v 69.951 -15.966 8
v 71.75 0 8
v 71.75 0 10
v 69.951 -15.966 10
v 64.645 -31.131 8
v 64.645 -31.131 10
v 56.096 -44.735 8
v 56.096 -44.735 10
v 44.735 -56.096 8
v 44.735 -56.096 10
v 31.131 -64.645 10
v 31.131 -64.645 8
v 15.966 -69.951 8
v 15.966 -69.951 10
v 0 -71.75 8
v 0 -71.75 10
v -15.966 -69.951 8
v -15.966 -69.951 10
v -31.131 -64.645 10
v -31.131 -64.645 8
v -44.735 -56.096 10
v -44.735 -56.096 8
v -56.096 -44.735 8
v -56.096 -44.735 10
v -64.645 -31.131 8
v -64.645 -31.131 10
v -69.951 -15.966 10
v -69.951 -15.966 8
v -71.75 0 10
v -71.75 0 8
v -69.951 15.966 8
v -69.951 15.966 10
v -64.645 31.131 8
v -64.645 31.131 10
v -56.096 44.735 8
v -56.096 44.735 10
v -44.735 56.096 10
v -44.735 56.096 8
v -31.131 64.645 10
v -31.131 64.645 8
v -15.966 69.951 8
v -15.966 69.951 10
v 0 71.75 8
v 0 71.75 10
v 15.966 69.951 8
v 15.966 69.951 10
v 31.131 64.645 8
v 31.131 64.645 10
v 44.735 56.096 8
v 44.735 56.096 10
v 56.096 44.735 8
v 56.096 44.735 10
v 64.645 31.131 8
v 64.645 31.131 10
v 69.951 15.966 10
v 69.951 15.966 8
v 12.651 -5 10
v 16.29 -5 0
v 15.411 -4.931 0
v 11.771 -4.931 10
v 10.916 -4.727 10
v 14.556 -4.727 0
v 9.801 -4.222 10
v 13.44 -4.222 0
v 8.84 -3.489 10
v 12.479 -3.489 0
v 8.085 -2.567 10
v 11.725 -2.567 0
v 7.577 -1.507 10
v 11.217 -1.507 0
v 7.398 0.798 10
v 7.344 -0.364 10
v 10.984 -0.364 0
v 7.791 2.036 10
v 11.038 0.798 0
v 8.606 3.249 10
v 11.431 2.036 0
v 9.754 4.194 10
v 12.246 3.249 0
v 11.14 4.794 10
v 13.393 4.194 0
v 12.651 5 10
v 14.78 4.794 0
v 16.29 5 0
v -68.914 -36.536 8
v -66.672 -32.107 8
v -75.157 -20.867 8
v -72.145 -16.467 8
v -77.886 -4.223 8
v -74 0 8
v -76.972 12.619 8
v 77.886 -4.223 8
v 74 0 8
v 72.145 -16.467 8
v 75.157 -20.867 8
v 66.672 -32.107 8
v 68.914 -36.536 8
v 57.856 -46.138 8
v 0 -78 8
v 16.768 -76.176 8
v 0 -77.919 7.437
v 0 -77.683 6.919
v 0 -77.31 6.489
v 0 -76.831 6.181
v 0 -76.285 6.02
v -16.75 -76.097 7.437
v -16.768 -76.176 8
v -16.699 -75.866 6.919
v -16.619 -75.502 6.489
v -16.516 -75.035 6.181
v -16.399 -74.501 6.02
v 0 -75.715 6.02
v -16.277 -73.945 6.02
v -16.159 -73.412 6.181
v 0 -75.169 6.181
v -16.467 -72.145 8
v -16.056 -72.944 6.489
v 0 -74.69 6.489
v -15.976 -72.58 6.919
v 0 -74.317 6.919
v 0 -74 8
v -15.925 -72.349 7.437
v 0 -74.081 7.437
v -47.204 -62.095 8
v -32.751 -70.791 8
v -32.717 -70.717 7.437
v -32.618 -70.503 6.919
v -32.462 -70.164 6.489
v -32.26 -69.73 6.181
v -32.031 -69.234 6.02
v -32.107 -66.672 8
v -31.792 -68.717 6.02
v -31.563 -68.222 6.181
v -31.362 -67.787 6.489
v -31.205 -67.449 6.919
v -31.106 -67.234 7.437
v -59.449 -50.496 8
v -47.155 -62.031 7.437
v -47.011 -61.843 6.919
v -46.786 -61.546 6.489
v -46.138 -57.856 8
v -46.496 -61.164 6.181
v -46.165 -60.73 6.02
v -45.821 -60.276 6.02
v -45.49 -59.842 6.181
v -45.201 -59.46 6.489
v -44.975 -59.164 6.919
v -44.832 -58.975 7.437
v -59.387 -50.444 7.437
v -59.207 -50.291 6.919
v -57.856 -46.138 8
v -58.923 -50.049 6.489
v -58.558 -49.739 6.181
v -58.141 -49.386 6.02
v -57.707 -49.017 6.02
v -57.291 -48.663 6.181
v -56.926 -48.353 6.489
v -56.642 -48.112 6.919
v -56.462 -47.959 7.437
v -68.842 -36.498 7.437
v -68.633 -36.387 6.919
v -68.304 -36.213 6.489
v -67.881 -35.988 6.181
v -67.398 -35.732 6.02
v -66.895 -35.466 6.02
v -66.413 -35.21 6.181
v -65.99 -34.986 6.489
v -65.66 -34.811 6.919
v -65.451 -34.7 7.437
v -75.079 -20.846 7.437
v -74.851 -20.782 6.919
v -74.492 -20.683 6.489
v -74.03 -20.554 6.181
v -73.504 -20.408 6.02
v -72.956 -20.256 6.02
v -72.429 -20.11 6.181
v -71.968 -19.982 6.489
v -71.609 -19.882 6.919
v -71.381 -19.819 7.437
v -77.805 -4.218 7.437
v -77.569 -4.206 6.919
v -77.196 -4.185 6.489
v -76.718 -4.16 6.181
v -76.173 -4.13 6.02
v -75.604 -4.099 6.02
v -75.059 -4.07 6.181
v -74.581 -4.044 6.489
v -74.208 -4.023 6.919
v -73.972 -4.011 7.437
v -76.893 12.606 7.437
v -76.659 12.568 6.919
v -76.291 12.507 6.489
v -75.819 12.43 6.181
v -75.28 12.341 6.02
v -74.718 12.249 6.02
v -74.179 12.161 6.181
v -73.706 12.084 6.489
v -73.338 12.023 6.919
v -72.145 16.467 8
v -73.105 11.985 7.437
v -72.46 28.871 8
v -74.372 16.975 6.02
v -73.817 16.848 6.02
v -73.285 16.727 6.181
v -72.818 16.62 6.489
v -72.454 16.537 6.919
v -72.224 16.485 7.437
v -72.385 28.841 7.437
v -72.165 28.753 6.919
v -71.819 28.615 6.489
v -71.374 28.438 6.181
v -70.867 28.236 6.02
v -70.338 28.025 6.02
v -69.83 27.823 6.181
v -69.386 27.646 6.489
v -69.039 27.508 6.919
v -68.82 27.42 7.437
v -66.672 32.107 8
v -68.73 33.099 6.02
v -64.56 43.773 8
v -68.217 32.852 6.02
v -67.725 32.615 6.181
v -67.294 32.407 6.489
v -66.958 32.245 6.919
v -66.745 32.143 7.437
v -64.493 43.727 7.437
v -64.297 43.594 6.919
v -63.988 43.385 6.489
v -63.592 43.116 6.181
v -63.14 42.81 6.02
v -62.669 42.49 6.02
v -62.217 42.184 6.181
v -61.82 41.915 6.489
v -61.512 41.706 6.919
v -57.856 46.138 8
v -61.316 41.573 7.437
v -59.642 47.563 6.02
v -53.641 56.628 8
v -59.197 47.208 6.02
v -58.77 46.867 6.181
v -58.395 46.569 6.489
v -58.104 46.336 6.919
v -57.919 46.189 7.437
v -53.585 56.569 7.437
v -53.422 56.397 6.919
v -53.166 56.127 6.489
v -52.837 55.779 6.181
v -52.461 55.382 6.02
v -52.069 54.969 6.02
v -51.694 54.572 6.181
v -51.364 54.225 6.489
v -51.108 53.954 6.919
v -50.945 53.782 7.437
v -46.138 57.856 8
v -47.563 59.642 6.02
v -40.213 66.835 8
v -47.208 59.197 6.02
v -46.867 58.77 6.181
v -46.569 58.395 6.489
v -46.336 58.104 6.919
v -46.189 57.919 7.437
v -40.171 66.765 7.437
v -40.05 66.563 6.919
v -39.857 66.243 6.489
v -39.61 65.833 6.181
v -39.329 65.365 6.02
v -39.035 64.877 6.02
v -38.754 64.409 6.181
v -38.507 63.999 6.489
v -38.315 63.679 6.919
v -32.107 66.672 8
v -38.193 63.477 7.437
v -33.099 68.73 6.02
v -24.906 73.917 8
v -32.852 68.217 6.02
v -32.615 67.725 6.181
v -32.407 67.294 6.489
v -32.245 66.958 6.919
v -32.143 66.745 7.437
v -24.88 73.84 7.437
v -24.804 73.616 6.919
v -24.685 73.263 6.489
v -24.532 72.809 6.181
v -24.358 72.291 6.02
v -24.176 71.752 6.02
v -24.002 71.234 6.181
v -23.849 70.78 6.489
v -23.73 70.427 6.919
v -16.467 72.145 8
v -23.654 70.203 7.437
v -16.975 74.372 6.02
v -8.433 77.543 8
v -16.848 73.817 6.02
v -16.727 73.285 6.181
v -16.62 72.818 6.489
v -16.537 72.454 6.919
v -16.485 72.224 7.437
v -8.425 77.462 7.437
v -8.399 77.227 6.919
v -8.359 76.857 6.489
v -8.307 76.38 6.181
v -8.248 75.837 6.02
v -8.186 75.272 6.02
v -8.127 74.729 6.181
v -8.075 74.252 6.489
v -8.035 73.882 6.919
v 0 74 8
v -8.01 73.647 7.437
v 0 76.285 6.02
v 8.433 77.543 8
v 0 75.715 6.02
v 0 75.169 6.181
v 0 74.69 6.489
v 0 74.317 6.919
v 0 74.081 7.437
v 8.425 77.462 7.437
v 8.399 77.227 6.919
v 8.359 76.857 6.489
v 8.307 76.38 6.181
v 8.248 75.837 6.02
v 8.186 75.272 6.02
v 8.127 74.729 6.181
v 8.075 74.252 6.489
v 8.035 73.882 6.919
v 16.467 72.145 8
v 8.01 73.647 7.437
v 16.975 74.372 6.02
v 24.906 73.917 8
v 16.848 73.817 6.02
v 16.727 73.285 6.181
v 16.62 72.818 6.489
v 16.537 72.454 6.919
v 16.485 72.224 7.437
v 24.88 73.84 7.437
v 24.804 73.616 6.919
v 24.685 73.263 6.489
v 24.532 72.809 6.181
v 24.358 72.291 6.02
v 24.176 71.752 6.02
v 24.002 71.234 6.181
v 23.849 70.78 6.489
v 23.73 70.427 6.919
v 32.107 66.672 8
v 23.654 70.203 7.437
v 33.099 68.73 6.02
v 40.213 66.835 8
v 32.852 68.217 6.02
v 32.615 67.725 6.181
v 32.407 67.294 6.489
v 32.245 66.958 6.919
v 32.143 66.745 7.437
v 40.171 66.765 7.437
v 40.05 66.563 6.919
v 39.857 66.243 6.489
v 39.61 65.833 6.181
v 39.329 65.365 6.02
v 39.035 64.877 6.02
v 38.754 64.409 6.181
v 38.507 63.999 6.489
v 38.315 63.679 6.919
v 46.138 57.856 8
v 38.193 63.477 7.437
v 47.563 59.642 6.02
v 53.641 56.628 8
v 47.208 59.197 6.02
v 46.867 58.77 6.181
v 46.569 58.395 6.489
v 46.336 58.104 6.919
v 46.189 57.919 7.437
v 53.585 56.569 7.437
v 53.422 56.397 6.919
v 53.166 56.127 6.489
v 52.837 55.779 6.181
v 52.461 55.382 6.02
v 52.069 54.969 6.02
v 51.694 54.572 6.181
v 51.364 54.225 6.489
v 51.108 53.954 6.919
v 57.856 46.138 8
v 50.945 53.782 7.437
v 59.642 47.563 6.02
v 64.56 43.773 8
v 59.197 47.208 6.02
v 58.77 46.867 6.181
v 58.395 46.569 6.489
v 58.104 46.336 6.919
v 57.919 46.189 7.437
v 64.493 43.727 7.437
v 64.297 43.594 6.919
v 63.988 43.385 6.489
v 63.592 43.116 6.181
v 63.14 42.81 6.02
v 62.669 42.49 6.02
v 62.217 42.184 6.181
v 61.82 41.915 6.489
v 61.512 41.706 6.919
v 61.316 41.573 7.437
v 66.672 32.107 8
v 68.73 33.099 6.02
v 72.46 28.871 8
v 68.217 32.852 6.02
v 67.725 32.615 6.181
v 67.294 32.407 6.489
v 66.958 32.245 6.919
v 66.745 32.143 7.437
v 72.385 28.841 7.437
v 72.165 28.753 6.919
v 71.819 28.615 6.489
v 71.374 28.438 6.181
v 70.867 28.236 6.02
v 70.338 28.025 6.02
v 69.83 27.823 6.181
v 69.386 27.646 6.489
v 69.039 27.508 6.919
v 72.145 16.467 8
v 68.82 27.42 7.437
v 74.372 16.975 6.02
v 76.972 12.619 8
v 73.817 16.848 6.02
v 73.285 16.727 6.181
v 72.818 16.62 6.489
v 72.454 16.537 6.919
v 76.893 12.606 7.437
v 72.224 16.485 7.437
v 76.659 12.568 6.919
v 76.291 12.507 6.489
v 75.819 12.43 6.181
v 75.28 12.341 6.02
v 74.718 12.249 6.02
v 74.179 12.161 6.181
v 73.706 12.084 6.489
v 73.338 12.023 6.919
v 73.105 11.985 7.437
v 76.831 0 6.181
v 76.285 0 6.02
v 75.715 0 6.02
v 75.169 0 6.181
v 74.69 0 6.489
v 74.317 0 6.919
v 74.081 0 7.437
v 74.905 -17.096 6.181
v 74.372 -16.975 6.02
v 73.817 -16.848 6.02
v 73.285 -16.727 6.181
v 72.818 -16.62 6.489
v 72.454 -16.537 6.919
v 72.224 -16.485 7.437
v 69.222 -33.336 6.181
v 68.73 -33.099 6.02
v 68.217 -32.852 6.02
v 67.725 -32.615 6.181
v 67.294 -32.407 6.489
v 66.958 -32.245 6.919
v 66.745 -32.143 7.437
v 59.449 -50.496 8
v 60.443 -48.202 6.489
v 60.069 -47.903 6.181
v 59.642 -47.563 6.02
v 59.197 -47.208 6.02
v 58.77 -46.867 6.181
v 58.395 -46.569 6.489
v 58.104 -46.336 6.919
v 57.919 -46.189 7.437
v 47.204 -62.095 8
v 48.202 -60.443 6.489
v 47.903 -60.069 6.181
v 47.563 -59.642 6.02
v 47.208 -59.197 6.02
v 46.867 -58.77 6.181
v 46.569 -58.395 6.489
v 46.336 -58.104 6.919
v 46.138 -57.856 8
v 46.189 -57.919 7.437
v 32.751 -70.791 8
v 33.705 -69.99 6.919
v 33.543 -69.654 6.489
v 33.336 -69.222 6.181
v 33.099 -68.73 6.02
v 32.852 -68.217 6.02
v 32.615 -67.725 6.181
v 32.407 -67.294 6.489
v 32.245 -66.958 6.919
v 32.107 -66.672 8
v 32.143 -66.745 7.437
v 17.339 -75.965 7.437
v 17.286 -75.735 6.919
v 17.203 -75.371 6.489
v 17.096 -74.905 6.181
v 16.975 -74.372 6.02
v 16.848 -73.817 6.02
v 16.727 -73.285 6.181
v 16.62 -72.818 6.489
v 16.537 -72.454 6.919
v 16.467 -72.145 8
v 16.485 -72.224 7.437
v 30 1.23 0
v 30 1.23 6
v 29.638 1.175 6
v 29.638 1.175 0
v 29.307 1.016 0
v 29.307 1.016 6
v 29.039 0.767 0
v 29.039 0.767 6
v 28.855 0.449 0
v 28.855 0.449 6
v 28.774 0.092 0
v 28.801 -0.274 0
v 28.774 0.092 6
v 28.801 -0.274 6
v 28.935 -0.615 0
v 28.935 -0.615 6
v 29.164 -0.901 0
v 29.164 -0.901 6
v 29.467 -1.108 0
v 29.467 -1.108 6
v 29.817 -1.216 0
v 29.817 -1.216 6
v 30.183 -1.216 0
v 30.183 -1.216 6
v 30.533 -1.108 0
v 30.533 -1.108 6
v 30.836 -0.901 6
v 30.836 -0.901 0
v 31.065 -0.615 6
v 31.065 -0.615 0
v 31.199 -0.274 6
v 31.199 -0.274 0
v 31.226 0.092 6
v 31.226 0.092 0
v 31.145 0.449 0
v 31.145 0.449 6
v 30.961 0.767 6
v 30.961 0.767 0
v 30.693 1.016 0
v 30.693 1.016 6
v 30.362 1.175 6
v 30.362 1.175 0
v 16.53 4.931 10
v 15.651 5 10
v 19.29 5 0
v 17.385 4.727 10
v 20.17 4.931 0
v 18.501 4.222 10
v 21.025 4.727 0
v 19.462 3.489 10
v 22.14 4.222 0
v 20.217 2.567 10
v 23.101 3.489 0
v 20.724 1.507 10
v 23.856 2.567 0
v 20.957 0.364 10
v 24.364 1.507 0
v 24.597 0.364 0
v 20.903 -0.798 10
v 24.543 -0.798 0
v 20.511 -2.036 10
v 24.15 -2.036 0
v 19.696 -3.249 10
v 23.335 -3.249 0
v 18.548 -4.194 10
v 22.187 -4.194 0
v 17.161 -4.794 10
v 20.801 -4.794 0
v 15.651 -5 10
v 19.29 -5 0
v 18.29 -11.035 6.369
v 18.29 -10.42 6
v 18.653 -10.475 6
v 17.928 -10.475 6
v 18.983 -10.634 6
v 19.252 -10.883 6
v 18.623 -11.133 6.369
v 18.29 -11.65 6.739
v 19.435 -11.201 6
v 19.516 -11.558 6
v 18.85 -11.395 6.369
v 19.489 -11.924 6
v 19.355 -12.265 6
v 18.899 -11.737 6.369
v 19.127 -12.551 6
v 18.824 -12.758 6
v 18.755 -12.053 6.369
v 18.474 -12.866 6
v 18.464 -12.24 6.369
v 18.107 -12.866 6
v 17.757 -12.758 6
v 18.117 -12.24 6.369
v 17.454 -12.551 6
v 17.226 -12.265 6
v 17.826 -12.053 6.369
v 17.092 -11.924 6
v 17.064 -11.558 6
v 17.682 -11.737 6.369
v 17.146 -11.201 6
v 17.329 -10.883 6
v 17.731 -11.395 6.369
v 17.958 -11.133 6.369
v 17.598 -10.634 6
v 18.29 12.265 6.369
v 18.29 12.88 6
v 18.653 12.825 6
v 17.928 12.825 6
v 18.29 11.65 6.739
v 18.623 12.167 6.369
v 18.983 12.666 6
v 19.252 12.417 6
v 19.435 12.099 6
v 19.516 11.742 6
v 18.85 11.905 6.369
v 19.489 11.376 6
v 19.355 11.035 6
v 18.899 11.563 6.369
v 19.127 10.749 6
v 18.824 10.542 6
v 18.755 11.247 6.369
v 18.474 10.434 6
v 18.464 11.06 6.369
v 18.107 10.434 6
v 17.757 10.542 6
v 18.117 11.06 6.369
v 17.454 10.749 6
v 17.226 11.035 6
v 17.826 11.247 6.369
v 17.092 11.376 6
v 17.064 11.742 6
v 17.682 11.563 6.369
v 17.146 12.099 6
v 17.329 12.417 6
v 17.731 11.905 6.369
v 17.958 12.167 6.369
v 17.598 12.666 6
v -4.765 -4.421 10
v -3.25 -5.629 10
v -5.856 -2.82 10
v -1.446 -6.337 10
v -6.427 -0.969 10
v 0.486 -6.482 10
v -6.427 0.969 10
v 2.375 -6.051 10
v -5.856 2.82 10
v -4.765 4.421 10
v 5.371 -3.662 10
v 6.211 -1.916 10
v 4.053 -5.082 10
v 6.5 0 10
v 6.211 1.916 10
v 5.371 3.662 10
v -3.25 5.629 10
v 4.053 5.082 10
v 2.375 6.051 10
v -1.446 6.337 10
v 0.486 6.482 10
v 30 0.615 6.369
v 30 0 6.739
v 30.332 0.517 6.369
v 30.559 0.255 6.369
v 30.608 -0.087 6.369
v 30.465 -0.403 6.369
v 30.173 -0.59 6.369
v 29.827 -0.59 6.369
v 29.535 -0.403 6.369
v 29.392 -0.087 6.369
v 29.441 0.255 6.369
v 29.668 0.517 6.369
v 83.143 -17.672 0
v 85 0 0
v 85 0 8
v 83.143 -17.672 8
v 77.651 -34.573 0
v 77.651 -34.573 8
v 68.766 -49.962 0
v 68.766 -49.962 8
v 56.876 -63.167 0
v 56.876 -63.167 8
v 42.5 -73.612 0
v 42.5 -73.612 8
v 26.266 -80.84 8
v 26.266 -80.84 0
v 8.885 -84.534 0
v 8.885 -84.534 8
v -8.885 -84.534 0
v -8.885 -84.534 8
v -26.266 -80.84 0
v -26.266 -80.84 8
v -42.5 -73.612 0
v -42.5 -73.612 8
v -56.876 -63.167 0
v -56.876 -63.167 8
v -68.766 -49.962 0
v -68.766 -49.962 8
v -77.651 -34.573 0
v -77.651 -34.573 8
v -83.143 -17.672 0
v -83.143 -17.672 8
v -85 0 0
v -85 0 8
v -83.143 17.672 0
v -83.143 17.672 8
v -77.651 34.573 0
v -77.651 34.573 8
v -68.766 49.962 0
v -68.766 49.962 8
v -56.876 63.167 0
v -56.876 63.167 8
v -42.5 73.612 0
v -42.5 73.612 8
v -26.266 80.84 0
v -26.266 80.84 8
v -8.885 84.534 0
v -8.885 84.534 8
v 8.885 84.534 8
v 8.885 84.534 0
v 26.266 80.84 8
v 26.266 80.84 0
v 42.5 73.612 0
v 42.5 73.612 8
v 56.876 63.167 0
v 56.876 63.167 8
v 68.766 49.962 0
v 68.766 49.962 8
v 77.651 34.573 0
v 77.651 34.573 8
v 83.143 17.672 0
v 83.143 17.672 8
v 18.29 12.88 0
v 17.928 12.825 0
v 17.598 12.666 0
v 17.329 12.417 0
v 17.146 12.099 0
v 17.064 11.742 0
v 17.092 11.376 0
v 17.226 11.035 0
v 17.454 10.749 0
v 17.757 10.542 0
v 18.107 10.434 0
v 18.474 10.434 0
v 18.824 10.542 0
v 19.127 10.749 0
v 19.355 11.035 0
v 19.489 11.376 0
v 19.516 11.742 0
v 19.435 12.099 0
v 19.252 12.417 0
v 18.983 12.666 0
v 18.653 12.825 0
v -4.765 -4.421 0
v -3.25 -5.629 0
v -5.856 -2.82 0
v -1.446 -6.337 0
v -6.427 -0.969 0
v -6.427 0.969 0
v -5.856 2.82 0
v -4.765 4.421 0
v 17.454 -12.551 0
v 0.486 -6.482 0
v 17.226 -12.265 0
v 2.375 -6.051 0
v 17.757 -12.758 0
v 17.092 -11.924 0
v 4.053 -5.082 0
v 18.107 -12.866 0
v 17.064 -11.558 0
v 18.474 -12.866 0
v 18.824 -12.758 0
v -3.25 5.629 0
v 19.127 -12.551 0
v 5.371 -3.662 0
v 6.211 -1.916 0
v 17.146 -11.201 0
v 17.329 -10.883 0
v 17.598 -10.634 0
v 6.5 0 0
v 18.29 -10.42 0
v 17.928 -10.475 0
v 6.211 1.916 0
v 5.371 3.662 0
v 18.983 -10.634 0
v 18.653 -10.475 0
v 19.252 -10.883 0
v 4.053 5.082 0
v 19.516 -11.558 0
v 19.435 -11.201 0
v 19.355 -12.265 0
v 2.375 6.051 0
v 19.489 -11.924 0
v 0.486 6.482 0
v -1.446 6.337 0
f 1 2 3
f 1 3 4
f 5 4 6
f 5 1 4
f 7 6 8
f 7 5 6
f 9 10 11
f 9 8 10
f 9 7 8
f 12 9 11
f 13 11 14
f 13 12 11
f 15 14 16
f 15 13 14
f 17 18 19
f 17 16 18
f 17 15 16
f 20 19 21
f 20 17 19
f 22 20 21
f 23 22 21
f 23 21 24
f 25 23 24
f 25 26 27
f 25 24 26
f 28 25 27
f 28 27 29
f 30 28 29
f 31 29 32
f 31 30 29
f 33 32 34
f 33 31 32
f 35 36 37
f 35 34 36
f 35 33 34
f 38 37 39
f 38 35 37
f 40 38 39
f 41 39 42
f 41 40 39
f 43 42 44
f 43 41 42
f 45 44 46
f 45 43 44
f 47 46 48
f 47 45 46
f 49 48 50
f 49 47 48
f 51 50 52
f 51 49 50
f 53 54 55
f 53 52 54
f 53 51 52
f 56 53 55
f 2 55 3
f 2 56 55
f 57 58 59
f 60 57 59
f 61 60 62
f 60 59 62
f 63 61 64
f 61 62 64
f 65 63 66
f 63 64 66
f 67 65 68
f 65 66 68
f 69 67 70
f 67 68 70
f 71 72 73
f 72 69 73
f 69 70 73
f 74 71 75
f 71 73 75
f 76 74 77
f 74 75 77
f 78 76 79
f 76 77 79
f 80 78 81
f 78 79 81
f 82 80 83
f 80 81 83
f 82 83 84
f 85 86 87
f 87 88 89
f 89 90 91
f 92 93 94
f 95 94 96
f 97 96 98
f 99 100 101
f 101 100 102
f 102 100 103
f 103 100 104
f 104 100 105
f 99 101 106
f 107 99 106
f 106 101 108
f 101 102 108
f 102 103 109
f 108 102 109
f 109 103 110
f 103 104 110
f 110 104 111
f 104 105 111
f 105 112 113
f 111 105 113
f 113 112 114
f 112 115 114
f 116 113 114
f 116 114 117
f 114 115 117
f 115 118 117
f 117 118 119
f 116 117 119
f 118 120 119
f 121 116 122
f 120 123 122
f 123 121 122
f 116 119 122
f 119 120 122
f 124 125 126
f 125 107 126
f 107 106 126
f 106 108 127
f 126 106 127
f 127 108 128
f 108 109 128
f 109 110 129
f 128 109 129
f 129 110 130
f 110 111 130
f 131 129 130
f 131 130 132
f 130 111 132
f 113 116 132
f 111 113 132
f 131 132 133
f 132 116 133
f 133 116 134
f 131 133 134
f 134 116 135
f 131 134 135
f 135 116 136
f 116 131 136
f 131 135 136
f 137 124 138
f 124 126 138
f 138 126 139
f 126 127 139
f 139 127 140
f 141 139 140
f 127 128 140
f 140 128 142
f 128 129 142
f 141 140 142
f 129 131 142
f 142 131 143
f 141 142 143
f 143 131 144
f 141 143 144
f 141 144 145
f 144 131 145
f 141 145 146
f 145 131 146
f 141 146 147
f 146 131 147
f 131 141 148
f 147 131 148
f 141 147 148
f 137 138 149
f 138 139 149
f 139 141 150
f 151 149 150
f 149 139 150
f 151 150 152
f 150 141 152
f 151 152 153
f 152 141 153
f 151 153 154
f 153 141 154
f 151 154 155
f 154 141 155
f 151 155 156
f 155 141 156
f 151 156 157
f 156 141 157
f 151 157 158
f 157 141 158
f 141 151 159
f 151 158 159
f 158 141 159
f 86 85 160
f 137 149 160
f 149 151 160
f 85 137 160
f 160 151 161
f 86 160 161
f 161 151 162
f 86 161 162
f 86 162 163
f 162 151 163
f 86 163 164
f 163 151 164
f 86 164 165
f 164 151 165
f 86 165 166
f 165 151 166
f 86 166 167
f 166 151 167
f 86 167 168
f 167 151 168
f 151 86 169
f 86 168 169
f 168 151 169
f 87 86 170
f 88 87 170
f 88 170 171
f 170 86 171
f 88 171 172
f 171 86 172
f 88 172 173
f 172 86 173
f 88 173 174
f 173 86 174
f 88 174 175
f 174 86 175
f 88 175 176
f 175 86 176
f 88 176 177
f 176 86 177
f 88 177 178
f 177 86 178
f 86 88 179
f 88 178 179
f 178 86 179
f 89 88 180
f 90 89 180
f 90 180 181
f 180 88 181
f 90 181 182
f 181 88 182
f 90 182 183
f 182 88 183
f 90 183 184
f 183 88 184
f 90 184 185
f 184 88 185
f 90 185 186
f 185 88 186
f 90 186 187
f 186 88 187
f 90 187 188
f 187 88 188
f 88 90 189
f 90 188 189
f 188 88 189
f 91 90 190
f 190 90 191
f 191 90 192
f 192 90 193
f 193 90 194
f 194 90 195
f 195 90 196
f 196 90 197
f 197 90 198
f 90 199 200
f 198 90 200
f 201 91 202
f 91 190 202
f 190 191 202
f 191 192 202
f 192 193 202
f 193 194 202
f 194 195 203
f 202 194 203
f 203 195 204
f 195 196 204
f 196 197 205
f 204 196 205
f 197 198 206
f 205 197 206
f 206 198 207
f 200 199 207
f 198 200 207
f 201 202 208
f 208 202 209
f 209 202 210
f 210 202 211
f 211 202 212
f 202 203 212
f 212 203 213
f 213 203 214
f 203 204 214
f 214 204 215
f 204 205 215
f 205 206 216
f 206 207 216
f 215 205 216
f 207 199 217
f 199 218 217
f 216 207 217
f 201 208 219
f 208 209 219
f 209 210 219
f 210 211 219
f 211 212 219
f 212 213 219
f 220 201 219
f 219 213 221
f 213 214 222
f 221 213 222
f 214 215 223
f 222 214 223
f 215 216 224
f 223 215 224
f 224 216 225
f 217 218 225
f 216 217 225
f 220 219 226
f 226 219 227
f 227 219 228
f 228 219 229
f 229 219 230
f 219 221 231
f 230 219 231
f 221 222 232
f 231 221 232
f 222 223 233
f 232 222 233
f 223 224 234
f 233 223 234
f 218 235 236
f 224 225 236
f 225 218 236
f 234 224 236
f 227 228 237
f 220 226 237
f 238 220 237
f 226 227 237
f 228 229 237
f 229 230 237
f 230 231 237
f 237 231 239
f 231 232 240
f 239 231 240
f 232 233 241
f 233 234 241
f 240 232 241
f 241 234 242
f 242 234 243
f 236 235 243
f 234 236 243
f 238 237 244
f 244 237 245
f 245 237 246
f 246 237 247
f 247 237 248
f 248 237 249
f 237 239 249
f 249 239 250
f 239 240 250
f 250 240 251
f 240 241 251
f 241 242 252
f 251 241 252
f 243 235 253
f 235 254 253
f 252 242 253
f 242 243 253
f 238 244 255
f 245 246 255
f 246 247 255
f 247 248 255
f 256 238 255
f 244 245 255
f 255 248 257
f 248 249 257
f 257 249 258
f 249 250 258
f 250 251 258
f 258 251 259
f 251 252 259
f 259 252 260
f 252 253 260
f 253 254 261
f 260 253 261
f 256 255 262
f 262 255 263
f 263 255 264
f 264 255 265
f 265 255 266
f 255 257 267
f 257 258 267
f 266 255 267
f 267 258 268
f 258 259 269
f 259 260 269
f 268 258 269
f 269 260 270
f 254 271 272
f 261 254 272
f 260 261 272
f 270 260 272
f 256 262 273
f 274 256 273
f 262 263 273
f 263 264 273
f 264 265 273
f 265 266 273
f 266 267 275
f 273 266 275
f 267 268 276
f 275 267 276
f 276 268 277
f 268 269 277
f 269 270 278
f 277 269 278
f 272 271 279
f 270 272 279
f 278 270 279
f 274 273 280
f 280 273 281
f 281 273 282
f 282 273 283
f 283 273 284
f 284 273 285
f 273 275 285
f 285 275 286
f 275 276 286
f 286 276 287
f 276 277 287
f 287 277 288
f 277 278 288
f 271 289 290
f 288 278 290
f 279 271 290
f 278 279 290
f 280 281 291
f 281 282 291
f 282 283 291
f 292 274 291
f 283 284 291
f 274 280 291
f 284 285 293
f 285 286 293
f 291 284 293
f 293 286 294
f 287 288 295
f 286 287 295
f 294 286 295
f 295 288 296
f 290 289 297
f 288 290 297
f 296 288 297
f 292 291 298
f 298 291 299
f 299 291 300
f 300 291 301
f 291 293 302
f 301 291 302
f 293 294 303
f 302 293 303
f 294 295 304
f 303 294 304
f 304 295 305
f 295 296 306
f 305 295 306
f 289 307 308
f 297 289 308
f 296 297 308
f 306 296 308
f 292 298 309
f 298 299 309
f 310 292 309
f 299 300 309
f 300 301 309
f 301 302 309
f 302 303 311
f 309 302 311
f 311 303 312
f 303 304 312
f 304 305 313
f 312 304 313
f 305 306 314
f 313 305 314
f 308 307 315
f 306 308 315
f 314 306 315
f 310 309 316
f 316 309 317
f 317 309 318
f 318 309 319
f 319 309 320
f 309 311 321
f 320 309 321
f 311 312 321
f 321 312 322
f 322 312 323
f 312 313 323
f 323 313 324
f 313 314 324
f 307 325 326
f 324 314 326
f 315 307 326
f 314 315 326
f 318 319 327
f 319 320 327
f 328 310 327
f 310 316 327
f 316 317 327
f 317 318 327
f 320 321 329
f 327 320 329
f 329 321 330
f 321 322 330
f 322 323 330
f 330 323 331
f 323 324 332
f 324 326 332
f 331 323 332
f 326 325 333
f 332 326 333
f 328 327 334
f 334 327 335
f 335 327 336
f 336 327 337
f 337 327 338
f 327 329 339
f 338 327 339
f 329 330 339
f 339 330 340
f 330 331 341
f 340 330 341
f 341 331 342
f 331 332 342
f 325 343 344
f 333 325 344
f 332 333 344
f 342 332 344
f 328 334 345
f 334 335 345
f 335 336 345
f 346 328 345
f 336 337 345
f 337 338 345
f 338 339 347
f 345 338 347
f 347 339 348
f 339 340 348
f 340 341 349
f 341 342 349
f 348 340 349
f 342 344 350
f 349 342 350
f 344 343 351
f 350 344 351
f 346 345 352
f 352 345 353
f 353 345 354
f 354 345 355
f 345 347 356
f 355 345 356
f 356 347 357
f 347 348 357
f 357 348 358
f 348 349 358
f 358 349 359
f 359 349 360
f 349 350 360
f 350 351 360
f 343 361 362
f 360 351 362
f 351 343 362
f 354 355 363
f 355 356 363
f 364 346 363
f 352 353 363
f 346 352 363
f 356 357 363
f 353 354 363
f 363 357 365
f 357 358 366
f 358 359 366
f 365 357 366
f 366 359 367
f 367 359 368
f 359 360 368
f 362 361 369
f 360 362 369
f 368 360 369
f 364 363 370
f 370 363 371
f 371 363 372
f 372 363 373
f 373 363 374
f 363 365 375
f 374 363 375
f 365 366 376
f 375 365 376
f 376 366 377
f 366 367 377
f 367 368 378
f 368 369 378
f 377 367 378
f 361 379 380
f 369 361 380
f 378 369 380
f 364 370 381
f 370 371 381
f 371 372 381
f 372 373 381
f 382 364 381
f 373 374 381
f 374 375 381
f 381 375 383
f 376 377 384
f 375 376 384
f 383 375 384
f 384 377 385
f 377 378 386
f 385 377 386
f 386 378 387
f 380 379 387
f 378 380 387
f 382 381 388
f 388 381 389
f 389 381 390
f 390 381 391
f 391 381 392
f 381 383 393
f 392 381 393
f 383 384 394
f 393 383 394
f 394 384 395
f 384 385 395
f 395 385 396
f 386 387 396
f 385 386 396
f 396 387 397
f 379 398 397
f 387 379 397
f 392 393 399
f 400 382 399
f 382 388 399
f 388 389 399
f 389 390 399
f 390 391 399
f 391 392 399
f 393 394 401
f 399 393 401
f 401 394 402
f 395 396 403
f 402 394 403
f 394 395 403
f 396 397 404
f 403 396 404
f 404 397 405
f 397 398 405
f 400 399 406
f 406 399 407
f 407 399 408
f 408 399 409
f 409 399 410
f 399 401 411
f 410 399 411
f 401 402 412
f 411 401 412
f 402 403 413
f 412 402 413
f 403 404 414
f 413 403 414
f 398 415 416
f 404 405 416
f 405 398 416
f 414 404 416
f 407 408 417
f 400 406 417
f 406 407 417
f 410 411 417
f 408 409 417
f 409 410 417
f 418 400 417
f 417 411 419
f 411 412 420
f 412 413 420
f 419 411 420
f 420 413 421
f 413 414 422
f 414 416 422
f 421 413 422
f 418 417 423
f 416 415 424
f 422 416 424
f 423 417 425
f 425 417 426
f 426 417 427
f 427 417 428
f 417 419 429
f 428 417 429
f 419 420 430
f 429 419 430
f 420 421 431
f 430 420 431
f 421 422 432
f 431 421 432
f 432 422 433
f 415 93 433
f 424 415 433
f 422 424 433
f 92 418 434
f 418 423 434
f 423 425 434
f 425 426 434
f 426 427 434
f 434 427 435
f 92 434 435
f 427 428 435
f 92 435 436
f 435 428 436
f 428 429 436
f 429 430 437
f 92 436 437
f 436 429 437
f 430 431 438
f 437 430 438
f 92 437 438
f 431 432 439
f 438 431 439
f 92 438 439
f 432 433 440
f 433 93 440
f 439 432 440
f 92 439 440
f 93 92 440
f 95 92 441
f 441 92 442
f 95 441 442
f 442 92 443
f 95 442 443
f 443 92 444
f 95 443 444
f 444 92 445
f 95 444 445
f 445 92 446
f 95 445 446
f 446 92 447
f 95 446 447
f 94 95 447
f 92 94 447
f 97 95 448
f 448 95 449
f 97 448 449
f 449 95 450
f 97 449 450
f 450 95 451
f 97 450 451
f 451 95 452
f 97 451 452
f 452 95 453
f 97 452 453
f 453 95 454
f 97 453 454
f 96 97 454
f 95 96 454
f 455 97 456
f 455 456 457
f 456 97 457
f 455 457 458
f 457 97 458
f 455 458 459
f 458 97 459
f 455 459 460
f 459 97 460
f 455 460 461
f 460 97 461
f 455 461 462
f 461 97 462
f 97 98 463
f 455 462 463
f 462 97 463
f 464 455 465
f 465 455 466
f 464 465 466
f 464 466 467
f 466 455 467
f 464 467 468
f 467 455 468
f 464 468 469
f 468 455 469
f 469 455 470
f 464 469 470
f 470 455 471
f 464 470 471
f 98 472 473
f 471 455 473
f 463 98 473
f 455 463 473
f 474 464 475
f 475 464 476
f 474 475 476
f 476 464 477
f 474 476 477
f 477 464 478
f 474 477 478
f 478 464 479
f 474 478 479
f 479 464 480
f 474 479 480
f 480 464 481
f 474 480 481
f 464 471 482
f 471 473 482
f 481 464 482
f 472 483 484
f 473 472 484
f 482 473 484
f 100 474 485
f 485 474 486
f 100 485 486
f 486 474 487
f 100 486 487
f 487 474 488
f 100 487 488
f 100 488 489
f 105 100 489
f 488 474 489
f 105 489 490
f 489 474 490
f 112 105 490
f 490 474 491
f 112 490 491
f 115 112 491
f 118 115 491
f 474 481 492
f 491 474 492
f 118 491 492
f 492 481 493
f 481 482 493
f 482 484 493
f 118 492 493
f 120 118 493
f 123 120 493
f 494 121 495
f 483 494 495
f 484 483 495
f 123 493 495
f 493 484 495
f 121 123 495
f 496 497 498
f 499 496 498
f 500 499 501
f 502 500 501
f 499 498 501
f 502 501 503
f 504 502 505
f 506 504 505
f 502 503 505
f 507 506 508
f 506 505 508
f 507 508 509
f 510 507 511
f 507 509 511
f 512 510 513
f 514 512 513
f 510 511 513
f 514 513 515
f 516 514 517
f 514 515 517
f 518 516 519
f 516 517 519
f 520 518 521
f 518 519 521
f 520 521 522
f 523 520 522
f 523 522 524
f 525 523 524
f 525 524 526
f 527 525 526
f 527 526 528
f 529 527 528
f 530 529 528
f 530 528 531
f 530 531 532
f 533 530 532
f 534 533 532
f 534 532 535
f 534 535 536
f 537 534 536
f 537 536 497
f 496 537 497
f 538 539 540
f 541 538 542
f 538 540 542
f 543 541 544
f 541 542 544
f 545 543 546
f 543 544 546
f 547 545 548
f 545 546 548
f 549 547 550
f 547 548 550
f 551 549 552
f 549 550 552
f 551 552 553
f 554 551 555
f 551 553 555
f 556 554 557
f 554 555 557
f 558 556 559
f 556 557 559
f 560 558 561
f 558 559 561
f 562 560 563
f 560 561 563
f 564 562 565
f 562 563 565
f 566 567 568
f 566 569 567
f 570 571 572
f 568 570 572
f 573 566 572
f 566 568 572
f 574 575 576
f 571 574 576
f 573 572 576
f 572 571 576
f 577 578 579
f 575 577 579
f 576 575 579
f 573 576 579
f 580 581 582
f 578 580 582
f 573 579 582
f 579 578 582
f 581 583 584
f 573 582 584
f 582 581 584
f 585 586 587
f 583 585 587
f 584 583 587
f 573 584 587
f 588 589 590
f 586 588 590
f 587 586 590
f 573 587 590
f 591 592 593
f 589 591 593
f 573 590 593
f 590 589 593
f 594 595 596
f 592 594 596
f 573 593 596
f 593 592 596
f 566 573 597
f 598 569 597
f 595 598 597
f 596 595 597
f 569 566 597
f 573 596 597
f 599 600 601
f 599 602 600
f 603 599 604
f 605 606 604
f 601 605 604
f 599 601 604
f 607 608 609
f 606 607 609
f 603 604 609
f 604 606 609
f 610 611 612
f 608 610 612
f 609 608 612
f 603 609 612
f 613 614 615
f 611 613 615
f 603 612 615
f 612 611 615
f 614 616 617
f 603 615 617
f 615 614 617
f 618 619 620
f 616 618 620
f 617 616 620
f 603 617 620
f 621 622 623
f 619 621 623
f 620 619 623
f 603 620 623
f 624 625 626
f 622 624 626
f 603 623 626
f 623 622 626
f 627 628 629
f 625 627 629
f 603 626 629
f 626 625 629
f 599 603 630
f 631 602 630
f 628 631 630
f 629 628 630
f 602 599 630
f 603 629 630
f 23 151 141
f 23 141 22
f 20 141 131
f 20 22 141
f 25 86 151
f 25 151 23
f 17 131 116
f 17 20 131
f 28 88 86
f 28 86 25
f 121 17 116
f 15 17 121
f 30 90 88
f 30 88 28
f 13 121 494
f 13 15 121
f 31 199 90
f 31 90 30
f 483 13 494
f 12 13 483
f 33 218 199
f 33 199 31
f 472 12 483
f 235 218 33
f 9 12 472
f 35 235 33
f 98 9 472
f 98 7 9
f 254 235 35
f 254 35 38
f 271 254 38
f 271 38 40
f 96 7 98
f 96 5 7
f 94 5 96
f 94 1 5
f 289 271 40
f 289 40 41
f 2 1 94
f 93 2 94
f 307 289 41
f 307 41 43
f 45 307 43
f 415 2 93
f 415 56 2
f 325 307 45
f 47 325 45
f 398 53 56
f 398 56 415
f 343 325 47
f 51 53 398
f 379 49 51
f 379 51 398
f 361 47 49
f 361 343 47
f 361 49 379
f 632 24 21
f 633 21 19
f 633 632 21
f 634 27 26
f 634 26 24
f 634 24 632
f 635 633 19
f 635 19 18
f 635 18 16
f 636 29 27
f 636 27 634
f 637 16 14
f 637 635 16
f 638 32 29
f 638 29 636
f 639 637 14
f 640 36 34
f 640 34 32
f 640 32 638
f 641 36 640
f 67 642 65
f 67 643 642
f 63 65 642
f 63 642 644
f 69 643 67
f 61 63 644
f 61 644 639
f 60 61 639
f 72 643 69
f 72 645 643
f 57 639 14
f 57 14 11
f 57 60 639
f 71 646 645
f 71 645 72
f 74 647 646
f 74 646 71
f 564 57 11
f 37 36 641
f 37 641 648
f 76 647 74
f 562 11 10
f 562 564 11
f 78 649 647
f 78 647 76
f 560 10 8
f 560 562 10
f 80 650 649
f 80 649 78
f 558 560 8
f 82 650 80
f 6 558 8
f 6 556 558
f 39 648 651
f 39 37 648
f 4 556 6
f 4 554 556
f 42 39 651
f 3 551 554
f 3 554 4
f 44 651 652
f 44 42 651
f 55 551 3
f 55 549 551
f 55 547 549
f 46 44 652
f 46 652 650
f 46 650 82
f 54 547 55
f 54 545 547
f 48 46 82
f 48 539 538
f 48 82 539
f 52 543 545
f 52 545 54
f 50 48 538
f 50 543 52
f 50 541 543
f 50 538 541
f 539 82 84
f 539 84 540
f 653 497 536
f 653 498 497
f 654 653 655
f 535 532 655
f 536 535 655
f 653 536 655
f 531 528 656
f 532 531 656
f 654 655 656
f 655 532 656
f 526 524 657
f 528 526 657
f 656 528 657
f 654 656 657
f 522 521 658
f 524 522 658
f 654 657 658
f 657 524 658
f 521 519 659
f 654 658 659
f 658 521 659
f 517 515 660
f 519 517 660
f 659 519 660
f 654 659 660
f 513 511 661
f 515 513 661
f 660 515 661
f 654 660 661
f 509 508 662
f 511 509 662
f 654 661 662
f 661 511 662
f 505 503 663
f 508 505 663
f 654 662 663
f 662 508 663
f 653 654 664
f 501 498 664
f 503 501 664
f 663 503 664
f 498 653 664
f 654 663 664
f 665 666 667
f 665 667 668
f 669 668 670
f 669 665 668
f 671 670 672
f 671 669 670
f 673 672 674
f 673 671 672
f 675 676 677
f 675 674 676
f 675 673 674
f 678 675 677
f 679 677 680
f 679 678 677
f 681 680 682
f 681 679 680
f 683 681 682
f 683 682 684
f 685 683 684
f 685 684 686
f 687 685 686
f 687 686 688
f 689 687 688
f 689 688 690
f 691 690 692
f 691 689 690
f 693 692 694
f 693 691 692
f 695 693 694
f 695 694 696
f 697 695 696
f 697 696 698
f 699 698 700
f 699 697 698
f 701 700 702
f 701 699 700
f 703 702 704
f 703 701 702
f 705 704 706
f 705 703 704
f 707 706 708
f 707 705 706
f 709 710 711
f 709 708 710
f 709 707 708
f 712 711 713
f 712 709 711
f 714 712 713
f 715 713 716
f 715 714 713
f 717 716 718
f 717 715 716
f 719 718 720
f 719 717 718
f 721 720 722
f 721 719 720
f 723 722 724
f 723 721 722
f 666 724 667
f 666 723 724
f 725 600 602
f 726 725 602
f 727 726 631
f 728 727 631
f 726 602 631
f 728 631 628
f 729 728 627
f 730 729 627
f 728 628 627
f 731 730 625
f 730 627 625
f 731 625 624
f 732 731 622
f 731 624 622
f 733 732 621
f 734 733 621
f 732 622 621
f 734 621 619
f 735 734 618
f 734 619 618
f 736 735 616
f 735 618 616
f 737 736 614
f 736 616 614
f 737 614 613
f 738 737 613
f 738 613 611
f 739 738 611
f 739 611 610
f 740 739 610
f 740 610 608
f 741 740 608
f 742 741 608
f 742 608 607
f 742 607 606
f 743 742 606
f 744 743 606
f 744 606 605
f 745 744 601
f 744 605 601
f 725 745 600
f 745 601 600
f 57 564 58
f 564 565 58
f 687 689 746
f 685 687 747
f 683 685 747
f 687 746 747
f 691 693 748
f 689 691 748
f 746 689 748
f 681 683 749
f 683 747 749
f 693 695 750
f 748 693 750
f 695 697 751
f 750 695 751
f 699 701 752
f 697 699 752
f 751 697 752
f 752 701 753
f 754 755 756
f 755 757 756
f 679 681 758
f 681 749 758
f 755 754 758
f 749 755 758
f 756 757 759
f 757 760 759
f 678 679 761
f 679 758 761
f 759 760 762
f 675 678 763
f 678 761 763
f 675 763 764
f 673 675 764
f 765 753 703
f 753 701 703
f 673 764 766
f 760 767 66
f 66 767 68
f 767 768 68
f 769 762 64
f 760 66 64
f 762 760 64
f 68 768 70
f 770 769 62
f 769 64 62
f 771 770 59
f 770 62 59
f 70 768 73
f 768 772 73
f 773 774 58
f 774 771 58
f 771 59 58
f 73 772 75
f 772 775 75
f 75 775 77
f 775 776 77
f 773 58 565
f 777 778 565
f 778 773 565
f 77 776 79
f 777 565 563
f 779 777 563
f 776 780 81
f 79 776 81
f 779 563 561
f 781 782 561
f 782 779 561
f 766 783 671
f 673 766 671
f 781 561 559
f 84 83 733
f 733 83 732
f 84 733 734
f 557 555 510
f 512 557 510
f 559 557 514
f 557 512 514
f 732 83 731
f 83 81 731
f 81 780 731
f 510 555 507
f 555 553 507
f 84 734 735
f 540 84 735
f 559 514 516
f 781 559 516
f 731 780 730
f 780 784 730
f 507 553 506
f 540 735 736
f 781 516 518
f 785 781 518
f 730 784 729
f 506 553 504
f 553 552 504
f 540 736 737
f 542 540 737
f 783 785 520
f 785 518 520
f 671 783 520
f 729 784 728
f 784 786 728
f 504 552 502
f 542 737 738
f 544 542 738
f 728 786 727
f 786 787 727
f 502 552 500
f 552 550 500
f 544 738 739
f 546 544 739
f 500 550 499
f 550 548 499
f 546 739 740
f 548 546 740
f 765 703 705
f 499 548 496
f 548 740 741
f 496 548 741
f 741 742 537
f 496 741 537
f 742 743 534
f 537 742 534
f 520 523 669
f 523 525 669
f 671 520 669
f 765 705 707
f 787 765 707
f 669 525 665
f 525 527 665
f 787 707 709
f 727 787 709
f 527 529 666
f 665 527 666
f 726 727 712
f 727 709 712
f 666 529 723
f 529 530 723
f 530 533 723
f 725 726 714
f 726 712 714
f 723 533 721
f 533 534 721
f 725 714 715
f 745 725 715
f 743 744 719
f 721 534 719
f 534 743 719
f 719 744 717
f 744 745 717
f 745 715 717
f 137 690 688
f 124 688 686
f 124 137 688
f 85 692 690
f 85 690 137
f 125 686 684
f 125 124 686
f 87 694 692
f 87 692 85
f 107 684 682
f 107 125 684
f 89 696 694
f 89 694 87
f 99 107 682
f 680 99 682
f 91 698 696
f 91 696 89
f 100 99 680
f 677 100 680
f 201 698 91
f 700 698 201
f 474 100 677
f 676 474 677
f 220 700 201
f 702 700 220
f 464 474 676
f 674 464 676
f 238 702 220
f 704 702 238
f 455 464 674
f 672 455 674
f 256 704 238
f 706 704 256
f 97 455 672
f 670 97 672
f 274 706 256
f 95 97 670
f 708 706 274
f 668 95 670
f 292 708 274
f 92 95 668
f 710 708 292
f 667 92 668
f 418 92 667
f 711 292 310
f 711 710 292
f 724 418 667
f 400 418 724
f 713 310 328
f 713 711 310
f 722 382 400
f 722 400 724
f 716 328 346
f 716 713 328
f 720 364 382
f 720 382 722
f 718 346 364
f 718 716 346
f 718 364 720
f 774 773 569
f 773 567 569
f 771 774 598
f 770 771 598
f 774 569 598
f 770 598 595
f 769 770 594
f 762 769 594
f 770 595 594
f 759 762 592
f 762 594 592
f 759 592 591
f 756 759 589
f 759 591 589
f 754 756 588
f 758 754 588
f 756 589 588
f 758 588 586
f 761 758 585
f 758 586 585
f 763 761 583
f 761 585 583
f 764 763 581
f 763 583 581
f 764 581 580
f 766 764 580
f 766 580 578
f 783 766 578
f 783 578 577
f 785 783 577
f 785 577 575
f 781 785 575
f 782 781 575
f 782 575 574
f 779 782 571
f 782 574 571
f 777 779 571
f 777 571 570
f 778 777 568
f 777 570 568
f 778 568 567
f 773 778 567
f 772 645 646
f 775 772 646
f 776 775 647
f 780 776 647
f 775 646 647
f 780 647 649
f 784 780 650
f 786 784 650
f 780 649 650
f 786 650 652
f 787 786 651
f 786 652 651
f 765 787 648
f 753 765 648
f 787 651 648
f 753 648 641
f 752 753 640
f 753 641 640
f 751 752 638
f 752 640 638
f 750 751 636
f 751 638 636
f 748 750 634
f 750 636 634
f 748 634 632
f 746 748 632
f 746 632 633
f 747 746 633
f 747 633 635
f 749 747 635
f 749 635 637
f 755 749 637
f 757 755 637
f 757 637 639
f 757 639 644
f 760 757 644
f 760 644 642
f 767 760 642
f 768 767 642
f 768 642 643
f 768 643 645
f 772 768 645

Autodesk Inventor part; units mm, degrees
ref_plane "YZ Plane" through (0, 0, 0) normal (1, 0, 0) x (0, 1, 0)
ref_plane "XZ Plane" through (0, 0, 0) normal (0, 1, 0) x (-1, 0, 0)
sketch "Sketch1" plane through (0, 0, 0) normal (0, 0, 1) x (1, 0, 0)
  circle A0 centre (0, 0) radius 85
  dimension "d0" = 170
extrude "Extrusion1" add sketch "Sketch1" along normal blind 8
sketch "Sketch2" plane through (0, 0, 8) normal (0, 0, 1) x (1, 0, 0)
  circle A0 centre (0, 0) radius 71.75
  dimension "d3" = 143.5
extrude "Extrusion2" add sketch "Sketch2" along normal blind 2
sketch "Sketch3" plane through (0, 0, 10) normal (0, 0, 1) x (1, 0, 0)
  circle A0 centre (0, 0) radius 6.5
  dimension "d6" = 13
extrude "Extrusion3" cut sketch "Sketch3" against normal through all
sketch "Sketch4" plane through (0, 0, 0) normal (0, 1, 0) x (-1, 0, 0)
  line L0 (0, 53) -> (-39.9771, -56.8361) construction
  line L1 (85, 8) -> (-85, 8) construction
  line L2 (0, -78.8034) -> (0, 74.9672) construction
  point P0 (0, 0)
  dimension "d9" = 45
  dimension "d10" = 20
ref_plane "Work Plane1" through (19.2904, 0, 0) normal (0.342, 0, -0.9397) x (0, 1, 0)
sketch "Sketch5" plane through (19.2904, 0, 0) normal (0.342, 0, -0.9397) x (0, 1, 0)
  line L0 (0, 0) -> (0, -2.8191) construction
  line L1 (-5, 0) -> (-5, -2.8191)
  line L2 (5, -2.8191) -> (5, 0)
  arc A0 (5, 0) -> (-5, 0) centre (0, 0) ccw
  arc A1 (-5, -2.8191) -> (5, -2.8191) centre (0, -2.8191) ccw
  line L3 (0, 0) -> (0, -2) construction
  line L4 (-5, 0) -> (-5, -2)
  line L5 (5, -2) -> (5, 0)
  arc A2 (5, 0) -> (-5, 0) centre (0, 0) ccw
  arc A3 (-5, -2) -> (5, -2) centre (0, -2) ccw
  point P0 (0, -18.1271)
  point P1 (0, -1.4095)
  point P2 (0, -1)
  point P3 (-5, -2)
  point P4 (5, -2)
  dimension "d12" = 10
  dimension "d13" = 2.8191
  dimension "d37" = 2
extrude "Extrusion4" cut sketch "Sketch5" against normal through all both and the other way through all
sketch "Sketch10" plane through (0, 0, 0) normal (0, 0, -1) x (-1, 0, 0)
  line L0 (119, 0) -> (-119, 0) projected
  line L1 (0, 0) -> (-18.2904, -11.65) construction
  line L2 (-18.2904, -11.65) -> (-18.2904, -5) construction
  line L3 (-16.2904, -5) -> (-19.2904, -5) construction
  point P0 (-18.2904, 11.65)
  point P1 (-30, 0)
  dimension "d50" = 30
  dimension "d60" = 11.65
  dimension "d61" = 1
hole "Hole1" at (18.2904, -11.65, 0) at (18.2904, 11.65, 0) at (30, 0, 0) direction (0, 0, 1) diameter 2.459 depth 6 tip angle 118 thread size "M3x0.5" class "6H" standard "ANSI Metric M Profile"
sketch "Sketch12" plane through (0, 0, 0) normal (1, 0, 0) x (0, 1, 0)
  line L0 (85, 8) -> (-85, 8) projected
  circle A0 centre (-76, 8) radius 2
  line L1 (0, -78.8034) -> (0, 74.9672) projected
  point P0 (0, 0)
  dimension "d63" = 4
  dimension "d64" = 76
revolve "Revolution1" cut sketch "Sketch12" angle 360 about axis through (0, 0, -10) along (0, 0, 1)
properties part number "Deckel" material "Polycarbonate, Clear"
